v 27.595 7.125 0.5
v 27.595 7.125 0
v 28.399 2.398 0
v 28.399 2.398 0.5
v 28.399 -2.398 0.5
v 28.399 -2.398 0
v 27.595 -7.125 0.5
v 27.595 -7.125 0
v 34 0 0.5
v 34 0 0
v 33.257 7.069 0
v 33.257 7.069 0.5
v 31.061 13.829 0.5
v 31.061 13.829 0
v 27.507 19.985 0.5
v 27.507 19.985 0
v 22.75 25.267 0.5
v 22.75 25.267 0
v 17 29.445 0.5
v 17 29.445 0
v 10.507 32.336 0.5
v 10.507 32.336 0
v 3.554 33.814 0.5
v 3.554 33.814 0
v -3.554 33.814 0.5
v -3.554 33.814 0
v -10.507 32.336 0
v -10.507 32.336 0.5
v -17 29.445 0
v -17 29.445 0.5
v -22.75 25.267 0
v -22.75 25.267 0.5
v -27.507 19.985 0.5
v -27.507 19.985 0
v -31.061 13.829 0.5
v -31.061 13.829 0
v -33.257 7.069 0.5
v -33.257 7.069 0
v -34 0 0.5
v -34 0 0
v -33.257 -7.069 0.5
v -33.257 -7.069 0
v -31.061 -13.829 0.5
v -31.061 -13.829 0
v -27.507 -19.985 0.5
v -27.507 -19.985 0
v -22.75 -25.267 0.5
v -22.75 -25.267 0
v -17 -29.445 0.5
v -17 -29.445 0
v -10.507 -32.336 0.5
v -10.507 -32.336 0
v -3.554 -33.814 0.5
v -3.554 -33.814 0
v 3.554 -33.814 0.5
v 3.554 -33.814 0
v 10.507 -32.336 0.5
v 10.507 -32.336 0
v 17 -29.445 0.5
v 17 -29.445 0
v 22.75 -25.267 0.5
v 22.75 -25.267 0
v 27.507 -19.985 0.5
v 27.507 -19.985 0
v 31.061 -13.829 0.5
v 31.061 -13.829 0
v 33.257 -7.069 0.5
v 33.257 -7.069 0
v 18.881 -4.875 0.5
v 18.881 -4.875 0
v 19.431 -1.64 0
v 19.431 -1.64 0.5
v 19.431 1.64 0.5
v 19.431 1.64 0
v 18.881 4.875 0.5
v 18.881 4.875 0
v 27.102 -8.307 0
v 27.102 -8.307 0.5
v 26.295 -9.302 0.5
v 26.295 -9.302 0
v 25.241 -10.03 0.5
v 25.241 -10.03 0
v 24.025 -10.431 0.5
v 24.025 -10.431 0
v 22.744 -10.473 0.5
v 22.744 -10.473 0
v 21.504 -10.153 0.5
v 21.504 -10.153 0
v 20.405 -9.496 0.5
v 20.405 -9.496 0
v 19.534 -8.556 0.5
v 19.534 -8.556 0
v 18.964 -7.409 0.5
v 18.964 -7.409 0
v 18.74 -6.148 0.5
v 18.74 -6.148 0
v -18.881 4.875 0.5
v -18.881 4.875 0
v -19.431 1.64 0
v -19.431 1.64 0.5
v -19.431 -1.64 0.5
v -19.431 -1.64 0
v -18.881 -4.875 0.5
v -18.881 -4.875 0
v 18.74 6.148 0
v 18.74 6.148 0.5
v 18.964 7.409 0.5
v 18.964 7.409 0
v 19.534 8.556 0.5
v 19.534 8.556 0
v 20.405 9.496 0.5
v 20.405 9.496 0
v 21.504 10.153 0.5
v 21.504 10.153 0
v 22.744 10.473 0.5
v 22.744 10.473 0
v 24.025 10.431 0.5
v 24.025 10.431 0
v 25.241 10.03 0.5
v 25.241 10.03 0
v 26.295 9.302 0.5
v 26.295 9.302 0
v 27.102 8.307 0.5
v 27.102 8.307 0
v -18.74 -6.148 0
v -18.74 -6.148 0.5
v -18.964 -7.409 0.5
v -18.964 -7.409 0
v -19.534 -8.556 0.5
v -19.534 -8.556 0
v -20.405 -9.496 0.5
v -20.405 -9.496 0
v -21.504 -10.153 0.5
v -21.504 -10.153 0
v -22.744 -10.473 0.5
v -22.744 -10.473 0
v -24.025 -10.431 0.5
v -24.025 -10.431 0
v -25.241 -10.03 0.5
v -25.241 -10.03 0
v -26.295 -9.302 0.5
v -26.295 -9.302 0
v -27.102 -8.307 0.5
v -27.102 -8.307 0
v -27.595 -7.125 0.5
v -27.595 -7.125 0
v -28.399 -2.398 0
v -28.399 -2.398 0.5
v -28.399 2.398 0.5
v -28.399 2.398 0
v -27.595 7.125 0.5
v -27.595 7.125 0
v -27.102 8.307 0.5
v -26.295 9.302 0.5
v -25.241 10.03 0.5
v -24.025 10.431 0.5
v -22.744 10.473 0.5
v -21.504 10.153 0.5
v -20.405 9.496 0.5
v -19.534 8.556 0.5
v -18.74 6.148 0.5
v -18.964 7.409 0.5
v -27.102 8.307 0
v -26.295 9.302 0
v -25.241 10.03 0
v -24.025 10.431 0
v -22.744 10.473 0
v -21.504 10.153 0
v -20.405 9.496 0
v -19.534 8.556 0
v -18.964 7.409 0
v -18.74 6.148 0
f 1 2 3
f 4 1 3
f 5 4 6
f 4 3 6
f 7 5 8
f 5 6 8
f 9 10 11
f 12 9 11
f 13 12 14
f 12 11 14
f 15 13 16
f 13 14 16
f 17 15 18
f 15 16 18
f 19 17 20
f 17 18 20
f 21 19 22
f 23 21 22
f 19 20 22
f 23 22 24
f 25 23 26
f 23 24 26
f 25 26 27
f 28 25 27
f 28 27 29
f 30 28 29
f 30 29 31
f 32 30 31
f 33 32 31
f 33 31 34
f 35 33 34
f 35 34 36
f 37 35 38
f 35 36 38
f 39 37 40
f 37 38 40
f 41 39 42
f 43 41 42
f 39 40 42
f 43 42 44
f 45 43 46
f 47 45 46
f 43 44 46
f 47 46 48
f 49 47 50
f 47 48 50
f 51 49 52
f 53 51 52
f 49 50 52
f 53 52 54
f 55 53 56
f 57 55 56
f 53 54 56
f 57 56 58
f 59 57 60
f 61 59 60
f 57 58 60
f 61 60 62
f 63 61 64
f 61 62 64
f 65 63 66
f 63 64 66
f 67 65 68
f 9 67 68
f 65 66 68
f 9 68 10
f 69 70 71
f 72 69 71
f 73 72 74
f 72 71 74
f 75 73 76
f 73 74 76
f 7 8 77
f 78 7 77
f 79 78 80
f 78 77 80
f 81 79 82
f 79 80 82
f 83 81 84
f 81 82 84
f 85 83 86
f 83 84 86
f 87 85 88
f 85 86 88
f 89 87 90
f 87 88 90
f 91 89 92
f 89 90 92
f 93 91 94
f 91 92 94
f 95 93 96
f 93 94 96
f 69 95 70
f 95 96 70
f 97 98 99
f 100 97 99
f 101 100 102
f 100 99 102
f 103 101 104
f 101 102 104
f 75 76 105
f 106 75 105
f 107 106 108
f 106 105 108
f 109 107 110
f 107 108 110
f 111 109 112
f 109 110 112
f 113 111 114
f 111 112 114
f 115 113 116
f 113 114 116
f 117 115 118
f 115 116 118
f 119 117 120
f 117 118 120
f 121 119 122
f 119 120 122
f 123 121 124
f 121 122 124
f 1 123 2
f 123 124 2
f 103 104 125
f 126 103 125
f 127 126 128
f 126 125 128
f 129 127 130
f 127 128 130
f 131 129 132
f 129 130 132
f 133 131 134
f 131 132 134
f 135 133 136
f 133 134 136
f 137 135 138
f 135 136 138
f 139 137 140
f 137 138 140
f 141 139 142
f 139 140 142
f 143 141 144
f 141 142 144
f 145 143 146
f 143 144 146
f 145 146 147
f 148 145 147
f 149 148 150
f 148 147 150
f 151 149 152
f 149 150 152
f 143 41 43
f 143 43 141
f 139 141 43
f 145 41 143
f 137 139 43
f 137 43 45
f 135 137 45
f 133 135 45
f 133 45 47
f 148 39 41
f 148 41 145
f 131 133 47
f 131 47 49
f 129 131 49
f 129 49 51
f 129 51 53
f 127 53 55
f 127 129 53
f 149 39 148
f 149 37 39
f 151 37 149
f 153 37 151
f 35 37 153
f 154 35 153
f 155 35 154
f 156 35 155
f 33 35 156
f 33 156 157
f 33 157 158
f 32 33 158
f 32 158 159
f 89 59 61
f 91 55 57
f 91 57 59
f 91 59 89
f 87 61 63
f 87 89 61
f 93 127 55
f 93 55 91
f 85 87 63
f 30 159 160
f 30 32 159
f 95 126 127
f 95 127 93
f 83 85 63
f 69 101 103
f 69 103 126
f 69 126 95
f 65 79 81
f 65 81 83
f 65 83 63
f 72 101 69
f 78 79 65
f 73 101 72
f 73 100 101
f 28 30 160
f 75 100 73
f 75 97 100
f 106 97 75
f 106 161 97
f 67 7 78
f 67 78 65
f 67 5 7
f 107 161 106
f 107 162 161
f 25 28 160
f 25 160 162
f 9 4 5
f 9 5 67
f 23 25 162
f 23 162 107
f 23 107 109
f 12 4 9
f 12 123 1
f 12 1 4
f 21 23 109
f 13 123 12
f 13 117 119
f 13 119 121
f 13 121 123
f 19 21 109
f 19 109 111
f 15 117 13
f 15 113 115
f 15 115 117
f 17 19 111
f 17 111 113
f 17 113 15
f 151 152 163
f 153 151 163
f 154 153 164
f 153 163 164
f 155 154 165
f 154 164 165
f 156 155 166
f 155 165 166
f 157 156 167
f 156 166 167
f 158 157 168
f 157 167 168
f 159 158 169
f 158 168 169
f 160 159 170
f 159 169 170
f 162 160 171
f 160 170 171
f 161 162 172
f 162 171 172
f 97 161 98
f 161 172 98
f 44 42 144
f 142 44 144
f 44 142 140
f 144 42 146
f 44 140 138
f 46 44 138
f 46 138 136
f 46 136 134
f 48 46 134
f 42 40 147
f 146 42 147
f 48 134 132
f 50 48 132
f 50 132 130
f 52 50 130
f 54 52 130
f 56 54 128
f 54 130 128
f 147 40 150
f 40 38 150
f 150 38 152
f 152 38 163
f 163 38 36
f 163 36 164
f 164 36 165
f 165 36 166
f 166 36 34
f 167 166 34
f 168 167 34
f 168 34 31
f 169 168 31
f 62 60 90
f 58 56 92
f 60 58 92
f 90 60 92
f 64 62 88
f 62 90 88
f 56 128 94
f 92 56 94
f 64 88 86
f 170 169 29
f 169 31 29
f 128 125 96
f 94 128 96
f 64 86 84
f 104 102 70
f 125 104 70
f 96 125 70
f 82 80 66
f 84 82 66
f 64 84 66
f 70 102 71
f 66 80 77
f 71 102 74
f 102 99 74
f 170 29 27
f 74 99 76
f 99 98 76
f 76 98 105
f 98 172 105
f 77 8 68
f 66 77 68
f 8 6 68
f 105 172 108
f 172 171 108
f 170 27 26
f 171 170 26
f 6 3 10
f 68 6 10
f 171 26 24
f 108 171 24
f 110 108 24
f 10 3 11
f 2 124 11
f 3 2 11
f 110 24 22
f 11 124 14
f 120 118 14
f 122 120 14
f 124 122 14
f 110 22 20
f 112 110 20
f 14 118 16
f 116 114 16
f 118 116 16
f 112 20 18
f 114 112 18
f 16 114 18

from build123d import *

# Parameters (mm, degrees)
F0_R     = 34
F1_DEPTH = 0.5


with BuildPart() as f1:
    # F0 (on Top) → F1 (new body)
    with BuildSketch(Plane.XY):
        Circle(F0_R)
        with BuildLine():
            ThreePointArc((-27.595006, 7.125), (-22.1129, 10.357106), (-18.880794, 4.875))
            ThreePointArc((-18.880794, 4.875), (-19.5, 0), (-18.880794, -4.875))
            ThreePointArc((-18.880794, -4.875), (-22.1129, -10.357106), (-27.595006, -7.125))
            ThreePointArc((-27.595006, -7.125), (-28.5, 0), (-27.595006, 7.125))
        make_face(mode=Mode.SUBTRACT)
        with BuildLine():
            ThreePointArc((18.880794, -4.875), (19.5, 0), (18.880794, 4.875))
            ThreePointArc((18.880794, 4.875), (22.1129, 10.357106), (27.595006, 7.125))
            ThreePointArc((27.595006, 7.125), (28.5, 0), (27.595006, -7.125))
            ThreePointArc((27.595006, -7.125), (22.1129, -10.357106), (18.880794, -4.875))
        make_face(mode=Mode.SUBTRACT)
    extrude(amount=F1_DEPTH)


solid = f1.part
